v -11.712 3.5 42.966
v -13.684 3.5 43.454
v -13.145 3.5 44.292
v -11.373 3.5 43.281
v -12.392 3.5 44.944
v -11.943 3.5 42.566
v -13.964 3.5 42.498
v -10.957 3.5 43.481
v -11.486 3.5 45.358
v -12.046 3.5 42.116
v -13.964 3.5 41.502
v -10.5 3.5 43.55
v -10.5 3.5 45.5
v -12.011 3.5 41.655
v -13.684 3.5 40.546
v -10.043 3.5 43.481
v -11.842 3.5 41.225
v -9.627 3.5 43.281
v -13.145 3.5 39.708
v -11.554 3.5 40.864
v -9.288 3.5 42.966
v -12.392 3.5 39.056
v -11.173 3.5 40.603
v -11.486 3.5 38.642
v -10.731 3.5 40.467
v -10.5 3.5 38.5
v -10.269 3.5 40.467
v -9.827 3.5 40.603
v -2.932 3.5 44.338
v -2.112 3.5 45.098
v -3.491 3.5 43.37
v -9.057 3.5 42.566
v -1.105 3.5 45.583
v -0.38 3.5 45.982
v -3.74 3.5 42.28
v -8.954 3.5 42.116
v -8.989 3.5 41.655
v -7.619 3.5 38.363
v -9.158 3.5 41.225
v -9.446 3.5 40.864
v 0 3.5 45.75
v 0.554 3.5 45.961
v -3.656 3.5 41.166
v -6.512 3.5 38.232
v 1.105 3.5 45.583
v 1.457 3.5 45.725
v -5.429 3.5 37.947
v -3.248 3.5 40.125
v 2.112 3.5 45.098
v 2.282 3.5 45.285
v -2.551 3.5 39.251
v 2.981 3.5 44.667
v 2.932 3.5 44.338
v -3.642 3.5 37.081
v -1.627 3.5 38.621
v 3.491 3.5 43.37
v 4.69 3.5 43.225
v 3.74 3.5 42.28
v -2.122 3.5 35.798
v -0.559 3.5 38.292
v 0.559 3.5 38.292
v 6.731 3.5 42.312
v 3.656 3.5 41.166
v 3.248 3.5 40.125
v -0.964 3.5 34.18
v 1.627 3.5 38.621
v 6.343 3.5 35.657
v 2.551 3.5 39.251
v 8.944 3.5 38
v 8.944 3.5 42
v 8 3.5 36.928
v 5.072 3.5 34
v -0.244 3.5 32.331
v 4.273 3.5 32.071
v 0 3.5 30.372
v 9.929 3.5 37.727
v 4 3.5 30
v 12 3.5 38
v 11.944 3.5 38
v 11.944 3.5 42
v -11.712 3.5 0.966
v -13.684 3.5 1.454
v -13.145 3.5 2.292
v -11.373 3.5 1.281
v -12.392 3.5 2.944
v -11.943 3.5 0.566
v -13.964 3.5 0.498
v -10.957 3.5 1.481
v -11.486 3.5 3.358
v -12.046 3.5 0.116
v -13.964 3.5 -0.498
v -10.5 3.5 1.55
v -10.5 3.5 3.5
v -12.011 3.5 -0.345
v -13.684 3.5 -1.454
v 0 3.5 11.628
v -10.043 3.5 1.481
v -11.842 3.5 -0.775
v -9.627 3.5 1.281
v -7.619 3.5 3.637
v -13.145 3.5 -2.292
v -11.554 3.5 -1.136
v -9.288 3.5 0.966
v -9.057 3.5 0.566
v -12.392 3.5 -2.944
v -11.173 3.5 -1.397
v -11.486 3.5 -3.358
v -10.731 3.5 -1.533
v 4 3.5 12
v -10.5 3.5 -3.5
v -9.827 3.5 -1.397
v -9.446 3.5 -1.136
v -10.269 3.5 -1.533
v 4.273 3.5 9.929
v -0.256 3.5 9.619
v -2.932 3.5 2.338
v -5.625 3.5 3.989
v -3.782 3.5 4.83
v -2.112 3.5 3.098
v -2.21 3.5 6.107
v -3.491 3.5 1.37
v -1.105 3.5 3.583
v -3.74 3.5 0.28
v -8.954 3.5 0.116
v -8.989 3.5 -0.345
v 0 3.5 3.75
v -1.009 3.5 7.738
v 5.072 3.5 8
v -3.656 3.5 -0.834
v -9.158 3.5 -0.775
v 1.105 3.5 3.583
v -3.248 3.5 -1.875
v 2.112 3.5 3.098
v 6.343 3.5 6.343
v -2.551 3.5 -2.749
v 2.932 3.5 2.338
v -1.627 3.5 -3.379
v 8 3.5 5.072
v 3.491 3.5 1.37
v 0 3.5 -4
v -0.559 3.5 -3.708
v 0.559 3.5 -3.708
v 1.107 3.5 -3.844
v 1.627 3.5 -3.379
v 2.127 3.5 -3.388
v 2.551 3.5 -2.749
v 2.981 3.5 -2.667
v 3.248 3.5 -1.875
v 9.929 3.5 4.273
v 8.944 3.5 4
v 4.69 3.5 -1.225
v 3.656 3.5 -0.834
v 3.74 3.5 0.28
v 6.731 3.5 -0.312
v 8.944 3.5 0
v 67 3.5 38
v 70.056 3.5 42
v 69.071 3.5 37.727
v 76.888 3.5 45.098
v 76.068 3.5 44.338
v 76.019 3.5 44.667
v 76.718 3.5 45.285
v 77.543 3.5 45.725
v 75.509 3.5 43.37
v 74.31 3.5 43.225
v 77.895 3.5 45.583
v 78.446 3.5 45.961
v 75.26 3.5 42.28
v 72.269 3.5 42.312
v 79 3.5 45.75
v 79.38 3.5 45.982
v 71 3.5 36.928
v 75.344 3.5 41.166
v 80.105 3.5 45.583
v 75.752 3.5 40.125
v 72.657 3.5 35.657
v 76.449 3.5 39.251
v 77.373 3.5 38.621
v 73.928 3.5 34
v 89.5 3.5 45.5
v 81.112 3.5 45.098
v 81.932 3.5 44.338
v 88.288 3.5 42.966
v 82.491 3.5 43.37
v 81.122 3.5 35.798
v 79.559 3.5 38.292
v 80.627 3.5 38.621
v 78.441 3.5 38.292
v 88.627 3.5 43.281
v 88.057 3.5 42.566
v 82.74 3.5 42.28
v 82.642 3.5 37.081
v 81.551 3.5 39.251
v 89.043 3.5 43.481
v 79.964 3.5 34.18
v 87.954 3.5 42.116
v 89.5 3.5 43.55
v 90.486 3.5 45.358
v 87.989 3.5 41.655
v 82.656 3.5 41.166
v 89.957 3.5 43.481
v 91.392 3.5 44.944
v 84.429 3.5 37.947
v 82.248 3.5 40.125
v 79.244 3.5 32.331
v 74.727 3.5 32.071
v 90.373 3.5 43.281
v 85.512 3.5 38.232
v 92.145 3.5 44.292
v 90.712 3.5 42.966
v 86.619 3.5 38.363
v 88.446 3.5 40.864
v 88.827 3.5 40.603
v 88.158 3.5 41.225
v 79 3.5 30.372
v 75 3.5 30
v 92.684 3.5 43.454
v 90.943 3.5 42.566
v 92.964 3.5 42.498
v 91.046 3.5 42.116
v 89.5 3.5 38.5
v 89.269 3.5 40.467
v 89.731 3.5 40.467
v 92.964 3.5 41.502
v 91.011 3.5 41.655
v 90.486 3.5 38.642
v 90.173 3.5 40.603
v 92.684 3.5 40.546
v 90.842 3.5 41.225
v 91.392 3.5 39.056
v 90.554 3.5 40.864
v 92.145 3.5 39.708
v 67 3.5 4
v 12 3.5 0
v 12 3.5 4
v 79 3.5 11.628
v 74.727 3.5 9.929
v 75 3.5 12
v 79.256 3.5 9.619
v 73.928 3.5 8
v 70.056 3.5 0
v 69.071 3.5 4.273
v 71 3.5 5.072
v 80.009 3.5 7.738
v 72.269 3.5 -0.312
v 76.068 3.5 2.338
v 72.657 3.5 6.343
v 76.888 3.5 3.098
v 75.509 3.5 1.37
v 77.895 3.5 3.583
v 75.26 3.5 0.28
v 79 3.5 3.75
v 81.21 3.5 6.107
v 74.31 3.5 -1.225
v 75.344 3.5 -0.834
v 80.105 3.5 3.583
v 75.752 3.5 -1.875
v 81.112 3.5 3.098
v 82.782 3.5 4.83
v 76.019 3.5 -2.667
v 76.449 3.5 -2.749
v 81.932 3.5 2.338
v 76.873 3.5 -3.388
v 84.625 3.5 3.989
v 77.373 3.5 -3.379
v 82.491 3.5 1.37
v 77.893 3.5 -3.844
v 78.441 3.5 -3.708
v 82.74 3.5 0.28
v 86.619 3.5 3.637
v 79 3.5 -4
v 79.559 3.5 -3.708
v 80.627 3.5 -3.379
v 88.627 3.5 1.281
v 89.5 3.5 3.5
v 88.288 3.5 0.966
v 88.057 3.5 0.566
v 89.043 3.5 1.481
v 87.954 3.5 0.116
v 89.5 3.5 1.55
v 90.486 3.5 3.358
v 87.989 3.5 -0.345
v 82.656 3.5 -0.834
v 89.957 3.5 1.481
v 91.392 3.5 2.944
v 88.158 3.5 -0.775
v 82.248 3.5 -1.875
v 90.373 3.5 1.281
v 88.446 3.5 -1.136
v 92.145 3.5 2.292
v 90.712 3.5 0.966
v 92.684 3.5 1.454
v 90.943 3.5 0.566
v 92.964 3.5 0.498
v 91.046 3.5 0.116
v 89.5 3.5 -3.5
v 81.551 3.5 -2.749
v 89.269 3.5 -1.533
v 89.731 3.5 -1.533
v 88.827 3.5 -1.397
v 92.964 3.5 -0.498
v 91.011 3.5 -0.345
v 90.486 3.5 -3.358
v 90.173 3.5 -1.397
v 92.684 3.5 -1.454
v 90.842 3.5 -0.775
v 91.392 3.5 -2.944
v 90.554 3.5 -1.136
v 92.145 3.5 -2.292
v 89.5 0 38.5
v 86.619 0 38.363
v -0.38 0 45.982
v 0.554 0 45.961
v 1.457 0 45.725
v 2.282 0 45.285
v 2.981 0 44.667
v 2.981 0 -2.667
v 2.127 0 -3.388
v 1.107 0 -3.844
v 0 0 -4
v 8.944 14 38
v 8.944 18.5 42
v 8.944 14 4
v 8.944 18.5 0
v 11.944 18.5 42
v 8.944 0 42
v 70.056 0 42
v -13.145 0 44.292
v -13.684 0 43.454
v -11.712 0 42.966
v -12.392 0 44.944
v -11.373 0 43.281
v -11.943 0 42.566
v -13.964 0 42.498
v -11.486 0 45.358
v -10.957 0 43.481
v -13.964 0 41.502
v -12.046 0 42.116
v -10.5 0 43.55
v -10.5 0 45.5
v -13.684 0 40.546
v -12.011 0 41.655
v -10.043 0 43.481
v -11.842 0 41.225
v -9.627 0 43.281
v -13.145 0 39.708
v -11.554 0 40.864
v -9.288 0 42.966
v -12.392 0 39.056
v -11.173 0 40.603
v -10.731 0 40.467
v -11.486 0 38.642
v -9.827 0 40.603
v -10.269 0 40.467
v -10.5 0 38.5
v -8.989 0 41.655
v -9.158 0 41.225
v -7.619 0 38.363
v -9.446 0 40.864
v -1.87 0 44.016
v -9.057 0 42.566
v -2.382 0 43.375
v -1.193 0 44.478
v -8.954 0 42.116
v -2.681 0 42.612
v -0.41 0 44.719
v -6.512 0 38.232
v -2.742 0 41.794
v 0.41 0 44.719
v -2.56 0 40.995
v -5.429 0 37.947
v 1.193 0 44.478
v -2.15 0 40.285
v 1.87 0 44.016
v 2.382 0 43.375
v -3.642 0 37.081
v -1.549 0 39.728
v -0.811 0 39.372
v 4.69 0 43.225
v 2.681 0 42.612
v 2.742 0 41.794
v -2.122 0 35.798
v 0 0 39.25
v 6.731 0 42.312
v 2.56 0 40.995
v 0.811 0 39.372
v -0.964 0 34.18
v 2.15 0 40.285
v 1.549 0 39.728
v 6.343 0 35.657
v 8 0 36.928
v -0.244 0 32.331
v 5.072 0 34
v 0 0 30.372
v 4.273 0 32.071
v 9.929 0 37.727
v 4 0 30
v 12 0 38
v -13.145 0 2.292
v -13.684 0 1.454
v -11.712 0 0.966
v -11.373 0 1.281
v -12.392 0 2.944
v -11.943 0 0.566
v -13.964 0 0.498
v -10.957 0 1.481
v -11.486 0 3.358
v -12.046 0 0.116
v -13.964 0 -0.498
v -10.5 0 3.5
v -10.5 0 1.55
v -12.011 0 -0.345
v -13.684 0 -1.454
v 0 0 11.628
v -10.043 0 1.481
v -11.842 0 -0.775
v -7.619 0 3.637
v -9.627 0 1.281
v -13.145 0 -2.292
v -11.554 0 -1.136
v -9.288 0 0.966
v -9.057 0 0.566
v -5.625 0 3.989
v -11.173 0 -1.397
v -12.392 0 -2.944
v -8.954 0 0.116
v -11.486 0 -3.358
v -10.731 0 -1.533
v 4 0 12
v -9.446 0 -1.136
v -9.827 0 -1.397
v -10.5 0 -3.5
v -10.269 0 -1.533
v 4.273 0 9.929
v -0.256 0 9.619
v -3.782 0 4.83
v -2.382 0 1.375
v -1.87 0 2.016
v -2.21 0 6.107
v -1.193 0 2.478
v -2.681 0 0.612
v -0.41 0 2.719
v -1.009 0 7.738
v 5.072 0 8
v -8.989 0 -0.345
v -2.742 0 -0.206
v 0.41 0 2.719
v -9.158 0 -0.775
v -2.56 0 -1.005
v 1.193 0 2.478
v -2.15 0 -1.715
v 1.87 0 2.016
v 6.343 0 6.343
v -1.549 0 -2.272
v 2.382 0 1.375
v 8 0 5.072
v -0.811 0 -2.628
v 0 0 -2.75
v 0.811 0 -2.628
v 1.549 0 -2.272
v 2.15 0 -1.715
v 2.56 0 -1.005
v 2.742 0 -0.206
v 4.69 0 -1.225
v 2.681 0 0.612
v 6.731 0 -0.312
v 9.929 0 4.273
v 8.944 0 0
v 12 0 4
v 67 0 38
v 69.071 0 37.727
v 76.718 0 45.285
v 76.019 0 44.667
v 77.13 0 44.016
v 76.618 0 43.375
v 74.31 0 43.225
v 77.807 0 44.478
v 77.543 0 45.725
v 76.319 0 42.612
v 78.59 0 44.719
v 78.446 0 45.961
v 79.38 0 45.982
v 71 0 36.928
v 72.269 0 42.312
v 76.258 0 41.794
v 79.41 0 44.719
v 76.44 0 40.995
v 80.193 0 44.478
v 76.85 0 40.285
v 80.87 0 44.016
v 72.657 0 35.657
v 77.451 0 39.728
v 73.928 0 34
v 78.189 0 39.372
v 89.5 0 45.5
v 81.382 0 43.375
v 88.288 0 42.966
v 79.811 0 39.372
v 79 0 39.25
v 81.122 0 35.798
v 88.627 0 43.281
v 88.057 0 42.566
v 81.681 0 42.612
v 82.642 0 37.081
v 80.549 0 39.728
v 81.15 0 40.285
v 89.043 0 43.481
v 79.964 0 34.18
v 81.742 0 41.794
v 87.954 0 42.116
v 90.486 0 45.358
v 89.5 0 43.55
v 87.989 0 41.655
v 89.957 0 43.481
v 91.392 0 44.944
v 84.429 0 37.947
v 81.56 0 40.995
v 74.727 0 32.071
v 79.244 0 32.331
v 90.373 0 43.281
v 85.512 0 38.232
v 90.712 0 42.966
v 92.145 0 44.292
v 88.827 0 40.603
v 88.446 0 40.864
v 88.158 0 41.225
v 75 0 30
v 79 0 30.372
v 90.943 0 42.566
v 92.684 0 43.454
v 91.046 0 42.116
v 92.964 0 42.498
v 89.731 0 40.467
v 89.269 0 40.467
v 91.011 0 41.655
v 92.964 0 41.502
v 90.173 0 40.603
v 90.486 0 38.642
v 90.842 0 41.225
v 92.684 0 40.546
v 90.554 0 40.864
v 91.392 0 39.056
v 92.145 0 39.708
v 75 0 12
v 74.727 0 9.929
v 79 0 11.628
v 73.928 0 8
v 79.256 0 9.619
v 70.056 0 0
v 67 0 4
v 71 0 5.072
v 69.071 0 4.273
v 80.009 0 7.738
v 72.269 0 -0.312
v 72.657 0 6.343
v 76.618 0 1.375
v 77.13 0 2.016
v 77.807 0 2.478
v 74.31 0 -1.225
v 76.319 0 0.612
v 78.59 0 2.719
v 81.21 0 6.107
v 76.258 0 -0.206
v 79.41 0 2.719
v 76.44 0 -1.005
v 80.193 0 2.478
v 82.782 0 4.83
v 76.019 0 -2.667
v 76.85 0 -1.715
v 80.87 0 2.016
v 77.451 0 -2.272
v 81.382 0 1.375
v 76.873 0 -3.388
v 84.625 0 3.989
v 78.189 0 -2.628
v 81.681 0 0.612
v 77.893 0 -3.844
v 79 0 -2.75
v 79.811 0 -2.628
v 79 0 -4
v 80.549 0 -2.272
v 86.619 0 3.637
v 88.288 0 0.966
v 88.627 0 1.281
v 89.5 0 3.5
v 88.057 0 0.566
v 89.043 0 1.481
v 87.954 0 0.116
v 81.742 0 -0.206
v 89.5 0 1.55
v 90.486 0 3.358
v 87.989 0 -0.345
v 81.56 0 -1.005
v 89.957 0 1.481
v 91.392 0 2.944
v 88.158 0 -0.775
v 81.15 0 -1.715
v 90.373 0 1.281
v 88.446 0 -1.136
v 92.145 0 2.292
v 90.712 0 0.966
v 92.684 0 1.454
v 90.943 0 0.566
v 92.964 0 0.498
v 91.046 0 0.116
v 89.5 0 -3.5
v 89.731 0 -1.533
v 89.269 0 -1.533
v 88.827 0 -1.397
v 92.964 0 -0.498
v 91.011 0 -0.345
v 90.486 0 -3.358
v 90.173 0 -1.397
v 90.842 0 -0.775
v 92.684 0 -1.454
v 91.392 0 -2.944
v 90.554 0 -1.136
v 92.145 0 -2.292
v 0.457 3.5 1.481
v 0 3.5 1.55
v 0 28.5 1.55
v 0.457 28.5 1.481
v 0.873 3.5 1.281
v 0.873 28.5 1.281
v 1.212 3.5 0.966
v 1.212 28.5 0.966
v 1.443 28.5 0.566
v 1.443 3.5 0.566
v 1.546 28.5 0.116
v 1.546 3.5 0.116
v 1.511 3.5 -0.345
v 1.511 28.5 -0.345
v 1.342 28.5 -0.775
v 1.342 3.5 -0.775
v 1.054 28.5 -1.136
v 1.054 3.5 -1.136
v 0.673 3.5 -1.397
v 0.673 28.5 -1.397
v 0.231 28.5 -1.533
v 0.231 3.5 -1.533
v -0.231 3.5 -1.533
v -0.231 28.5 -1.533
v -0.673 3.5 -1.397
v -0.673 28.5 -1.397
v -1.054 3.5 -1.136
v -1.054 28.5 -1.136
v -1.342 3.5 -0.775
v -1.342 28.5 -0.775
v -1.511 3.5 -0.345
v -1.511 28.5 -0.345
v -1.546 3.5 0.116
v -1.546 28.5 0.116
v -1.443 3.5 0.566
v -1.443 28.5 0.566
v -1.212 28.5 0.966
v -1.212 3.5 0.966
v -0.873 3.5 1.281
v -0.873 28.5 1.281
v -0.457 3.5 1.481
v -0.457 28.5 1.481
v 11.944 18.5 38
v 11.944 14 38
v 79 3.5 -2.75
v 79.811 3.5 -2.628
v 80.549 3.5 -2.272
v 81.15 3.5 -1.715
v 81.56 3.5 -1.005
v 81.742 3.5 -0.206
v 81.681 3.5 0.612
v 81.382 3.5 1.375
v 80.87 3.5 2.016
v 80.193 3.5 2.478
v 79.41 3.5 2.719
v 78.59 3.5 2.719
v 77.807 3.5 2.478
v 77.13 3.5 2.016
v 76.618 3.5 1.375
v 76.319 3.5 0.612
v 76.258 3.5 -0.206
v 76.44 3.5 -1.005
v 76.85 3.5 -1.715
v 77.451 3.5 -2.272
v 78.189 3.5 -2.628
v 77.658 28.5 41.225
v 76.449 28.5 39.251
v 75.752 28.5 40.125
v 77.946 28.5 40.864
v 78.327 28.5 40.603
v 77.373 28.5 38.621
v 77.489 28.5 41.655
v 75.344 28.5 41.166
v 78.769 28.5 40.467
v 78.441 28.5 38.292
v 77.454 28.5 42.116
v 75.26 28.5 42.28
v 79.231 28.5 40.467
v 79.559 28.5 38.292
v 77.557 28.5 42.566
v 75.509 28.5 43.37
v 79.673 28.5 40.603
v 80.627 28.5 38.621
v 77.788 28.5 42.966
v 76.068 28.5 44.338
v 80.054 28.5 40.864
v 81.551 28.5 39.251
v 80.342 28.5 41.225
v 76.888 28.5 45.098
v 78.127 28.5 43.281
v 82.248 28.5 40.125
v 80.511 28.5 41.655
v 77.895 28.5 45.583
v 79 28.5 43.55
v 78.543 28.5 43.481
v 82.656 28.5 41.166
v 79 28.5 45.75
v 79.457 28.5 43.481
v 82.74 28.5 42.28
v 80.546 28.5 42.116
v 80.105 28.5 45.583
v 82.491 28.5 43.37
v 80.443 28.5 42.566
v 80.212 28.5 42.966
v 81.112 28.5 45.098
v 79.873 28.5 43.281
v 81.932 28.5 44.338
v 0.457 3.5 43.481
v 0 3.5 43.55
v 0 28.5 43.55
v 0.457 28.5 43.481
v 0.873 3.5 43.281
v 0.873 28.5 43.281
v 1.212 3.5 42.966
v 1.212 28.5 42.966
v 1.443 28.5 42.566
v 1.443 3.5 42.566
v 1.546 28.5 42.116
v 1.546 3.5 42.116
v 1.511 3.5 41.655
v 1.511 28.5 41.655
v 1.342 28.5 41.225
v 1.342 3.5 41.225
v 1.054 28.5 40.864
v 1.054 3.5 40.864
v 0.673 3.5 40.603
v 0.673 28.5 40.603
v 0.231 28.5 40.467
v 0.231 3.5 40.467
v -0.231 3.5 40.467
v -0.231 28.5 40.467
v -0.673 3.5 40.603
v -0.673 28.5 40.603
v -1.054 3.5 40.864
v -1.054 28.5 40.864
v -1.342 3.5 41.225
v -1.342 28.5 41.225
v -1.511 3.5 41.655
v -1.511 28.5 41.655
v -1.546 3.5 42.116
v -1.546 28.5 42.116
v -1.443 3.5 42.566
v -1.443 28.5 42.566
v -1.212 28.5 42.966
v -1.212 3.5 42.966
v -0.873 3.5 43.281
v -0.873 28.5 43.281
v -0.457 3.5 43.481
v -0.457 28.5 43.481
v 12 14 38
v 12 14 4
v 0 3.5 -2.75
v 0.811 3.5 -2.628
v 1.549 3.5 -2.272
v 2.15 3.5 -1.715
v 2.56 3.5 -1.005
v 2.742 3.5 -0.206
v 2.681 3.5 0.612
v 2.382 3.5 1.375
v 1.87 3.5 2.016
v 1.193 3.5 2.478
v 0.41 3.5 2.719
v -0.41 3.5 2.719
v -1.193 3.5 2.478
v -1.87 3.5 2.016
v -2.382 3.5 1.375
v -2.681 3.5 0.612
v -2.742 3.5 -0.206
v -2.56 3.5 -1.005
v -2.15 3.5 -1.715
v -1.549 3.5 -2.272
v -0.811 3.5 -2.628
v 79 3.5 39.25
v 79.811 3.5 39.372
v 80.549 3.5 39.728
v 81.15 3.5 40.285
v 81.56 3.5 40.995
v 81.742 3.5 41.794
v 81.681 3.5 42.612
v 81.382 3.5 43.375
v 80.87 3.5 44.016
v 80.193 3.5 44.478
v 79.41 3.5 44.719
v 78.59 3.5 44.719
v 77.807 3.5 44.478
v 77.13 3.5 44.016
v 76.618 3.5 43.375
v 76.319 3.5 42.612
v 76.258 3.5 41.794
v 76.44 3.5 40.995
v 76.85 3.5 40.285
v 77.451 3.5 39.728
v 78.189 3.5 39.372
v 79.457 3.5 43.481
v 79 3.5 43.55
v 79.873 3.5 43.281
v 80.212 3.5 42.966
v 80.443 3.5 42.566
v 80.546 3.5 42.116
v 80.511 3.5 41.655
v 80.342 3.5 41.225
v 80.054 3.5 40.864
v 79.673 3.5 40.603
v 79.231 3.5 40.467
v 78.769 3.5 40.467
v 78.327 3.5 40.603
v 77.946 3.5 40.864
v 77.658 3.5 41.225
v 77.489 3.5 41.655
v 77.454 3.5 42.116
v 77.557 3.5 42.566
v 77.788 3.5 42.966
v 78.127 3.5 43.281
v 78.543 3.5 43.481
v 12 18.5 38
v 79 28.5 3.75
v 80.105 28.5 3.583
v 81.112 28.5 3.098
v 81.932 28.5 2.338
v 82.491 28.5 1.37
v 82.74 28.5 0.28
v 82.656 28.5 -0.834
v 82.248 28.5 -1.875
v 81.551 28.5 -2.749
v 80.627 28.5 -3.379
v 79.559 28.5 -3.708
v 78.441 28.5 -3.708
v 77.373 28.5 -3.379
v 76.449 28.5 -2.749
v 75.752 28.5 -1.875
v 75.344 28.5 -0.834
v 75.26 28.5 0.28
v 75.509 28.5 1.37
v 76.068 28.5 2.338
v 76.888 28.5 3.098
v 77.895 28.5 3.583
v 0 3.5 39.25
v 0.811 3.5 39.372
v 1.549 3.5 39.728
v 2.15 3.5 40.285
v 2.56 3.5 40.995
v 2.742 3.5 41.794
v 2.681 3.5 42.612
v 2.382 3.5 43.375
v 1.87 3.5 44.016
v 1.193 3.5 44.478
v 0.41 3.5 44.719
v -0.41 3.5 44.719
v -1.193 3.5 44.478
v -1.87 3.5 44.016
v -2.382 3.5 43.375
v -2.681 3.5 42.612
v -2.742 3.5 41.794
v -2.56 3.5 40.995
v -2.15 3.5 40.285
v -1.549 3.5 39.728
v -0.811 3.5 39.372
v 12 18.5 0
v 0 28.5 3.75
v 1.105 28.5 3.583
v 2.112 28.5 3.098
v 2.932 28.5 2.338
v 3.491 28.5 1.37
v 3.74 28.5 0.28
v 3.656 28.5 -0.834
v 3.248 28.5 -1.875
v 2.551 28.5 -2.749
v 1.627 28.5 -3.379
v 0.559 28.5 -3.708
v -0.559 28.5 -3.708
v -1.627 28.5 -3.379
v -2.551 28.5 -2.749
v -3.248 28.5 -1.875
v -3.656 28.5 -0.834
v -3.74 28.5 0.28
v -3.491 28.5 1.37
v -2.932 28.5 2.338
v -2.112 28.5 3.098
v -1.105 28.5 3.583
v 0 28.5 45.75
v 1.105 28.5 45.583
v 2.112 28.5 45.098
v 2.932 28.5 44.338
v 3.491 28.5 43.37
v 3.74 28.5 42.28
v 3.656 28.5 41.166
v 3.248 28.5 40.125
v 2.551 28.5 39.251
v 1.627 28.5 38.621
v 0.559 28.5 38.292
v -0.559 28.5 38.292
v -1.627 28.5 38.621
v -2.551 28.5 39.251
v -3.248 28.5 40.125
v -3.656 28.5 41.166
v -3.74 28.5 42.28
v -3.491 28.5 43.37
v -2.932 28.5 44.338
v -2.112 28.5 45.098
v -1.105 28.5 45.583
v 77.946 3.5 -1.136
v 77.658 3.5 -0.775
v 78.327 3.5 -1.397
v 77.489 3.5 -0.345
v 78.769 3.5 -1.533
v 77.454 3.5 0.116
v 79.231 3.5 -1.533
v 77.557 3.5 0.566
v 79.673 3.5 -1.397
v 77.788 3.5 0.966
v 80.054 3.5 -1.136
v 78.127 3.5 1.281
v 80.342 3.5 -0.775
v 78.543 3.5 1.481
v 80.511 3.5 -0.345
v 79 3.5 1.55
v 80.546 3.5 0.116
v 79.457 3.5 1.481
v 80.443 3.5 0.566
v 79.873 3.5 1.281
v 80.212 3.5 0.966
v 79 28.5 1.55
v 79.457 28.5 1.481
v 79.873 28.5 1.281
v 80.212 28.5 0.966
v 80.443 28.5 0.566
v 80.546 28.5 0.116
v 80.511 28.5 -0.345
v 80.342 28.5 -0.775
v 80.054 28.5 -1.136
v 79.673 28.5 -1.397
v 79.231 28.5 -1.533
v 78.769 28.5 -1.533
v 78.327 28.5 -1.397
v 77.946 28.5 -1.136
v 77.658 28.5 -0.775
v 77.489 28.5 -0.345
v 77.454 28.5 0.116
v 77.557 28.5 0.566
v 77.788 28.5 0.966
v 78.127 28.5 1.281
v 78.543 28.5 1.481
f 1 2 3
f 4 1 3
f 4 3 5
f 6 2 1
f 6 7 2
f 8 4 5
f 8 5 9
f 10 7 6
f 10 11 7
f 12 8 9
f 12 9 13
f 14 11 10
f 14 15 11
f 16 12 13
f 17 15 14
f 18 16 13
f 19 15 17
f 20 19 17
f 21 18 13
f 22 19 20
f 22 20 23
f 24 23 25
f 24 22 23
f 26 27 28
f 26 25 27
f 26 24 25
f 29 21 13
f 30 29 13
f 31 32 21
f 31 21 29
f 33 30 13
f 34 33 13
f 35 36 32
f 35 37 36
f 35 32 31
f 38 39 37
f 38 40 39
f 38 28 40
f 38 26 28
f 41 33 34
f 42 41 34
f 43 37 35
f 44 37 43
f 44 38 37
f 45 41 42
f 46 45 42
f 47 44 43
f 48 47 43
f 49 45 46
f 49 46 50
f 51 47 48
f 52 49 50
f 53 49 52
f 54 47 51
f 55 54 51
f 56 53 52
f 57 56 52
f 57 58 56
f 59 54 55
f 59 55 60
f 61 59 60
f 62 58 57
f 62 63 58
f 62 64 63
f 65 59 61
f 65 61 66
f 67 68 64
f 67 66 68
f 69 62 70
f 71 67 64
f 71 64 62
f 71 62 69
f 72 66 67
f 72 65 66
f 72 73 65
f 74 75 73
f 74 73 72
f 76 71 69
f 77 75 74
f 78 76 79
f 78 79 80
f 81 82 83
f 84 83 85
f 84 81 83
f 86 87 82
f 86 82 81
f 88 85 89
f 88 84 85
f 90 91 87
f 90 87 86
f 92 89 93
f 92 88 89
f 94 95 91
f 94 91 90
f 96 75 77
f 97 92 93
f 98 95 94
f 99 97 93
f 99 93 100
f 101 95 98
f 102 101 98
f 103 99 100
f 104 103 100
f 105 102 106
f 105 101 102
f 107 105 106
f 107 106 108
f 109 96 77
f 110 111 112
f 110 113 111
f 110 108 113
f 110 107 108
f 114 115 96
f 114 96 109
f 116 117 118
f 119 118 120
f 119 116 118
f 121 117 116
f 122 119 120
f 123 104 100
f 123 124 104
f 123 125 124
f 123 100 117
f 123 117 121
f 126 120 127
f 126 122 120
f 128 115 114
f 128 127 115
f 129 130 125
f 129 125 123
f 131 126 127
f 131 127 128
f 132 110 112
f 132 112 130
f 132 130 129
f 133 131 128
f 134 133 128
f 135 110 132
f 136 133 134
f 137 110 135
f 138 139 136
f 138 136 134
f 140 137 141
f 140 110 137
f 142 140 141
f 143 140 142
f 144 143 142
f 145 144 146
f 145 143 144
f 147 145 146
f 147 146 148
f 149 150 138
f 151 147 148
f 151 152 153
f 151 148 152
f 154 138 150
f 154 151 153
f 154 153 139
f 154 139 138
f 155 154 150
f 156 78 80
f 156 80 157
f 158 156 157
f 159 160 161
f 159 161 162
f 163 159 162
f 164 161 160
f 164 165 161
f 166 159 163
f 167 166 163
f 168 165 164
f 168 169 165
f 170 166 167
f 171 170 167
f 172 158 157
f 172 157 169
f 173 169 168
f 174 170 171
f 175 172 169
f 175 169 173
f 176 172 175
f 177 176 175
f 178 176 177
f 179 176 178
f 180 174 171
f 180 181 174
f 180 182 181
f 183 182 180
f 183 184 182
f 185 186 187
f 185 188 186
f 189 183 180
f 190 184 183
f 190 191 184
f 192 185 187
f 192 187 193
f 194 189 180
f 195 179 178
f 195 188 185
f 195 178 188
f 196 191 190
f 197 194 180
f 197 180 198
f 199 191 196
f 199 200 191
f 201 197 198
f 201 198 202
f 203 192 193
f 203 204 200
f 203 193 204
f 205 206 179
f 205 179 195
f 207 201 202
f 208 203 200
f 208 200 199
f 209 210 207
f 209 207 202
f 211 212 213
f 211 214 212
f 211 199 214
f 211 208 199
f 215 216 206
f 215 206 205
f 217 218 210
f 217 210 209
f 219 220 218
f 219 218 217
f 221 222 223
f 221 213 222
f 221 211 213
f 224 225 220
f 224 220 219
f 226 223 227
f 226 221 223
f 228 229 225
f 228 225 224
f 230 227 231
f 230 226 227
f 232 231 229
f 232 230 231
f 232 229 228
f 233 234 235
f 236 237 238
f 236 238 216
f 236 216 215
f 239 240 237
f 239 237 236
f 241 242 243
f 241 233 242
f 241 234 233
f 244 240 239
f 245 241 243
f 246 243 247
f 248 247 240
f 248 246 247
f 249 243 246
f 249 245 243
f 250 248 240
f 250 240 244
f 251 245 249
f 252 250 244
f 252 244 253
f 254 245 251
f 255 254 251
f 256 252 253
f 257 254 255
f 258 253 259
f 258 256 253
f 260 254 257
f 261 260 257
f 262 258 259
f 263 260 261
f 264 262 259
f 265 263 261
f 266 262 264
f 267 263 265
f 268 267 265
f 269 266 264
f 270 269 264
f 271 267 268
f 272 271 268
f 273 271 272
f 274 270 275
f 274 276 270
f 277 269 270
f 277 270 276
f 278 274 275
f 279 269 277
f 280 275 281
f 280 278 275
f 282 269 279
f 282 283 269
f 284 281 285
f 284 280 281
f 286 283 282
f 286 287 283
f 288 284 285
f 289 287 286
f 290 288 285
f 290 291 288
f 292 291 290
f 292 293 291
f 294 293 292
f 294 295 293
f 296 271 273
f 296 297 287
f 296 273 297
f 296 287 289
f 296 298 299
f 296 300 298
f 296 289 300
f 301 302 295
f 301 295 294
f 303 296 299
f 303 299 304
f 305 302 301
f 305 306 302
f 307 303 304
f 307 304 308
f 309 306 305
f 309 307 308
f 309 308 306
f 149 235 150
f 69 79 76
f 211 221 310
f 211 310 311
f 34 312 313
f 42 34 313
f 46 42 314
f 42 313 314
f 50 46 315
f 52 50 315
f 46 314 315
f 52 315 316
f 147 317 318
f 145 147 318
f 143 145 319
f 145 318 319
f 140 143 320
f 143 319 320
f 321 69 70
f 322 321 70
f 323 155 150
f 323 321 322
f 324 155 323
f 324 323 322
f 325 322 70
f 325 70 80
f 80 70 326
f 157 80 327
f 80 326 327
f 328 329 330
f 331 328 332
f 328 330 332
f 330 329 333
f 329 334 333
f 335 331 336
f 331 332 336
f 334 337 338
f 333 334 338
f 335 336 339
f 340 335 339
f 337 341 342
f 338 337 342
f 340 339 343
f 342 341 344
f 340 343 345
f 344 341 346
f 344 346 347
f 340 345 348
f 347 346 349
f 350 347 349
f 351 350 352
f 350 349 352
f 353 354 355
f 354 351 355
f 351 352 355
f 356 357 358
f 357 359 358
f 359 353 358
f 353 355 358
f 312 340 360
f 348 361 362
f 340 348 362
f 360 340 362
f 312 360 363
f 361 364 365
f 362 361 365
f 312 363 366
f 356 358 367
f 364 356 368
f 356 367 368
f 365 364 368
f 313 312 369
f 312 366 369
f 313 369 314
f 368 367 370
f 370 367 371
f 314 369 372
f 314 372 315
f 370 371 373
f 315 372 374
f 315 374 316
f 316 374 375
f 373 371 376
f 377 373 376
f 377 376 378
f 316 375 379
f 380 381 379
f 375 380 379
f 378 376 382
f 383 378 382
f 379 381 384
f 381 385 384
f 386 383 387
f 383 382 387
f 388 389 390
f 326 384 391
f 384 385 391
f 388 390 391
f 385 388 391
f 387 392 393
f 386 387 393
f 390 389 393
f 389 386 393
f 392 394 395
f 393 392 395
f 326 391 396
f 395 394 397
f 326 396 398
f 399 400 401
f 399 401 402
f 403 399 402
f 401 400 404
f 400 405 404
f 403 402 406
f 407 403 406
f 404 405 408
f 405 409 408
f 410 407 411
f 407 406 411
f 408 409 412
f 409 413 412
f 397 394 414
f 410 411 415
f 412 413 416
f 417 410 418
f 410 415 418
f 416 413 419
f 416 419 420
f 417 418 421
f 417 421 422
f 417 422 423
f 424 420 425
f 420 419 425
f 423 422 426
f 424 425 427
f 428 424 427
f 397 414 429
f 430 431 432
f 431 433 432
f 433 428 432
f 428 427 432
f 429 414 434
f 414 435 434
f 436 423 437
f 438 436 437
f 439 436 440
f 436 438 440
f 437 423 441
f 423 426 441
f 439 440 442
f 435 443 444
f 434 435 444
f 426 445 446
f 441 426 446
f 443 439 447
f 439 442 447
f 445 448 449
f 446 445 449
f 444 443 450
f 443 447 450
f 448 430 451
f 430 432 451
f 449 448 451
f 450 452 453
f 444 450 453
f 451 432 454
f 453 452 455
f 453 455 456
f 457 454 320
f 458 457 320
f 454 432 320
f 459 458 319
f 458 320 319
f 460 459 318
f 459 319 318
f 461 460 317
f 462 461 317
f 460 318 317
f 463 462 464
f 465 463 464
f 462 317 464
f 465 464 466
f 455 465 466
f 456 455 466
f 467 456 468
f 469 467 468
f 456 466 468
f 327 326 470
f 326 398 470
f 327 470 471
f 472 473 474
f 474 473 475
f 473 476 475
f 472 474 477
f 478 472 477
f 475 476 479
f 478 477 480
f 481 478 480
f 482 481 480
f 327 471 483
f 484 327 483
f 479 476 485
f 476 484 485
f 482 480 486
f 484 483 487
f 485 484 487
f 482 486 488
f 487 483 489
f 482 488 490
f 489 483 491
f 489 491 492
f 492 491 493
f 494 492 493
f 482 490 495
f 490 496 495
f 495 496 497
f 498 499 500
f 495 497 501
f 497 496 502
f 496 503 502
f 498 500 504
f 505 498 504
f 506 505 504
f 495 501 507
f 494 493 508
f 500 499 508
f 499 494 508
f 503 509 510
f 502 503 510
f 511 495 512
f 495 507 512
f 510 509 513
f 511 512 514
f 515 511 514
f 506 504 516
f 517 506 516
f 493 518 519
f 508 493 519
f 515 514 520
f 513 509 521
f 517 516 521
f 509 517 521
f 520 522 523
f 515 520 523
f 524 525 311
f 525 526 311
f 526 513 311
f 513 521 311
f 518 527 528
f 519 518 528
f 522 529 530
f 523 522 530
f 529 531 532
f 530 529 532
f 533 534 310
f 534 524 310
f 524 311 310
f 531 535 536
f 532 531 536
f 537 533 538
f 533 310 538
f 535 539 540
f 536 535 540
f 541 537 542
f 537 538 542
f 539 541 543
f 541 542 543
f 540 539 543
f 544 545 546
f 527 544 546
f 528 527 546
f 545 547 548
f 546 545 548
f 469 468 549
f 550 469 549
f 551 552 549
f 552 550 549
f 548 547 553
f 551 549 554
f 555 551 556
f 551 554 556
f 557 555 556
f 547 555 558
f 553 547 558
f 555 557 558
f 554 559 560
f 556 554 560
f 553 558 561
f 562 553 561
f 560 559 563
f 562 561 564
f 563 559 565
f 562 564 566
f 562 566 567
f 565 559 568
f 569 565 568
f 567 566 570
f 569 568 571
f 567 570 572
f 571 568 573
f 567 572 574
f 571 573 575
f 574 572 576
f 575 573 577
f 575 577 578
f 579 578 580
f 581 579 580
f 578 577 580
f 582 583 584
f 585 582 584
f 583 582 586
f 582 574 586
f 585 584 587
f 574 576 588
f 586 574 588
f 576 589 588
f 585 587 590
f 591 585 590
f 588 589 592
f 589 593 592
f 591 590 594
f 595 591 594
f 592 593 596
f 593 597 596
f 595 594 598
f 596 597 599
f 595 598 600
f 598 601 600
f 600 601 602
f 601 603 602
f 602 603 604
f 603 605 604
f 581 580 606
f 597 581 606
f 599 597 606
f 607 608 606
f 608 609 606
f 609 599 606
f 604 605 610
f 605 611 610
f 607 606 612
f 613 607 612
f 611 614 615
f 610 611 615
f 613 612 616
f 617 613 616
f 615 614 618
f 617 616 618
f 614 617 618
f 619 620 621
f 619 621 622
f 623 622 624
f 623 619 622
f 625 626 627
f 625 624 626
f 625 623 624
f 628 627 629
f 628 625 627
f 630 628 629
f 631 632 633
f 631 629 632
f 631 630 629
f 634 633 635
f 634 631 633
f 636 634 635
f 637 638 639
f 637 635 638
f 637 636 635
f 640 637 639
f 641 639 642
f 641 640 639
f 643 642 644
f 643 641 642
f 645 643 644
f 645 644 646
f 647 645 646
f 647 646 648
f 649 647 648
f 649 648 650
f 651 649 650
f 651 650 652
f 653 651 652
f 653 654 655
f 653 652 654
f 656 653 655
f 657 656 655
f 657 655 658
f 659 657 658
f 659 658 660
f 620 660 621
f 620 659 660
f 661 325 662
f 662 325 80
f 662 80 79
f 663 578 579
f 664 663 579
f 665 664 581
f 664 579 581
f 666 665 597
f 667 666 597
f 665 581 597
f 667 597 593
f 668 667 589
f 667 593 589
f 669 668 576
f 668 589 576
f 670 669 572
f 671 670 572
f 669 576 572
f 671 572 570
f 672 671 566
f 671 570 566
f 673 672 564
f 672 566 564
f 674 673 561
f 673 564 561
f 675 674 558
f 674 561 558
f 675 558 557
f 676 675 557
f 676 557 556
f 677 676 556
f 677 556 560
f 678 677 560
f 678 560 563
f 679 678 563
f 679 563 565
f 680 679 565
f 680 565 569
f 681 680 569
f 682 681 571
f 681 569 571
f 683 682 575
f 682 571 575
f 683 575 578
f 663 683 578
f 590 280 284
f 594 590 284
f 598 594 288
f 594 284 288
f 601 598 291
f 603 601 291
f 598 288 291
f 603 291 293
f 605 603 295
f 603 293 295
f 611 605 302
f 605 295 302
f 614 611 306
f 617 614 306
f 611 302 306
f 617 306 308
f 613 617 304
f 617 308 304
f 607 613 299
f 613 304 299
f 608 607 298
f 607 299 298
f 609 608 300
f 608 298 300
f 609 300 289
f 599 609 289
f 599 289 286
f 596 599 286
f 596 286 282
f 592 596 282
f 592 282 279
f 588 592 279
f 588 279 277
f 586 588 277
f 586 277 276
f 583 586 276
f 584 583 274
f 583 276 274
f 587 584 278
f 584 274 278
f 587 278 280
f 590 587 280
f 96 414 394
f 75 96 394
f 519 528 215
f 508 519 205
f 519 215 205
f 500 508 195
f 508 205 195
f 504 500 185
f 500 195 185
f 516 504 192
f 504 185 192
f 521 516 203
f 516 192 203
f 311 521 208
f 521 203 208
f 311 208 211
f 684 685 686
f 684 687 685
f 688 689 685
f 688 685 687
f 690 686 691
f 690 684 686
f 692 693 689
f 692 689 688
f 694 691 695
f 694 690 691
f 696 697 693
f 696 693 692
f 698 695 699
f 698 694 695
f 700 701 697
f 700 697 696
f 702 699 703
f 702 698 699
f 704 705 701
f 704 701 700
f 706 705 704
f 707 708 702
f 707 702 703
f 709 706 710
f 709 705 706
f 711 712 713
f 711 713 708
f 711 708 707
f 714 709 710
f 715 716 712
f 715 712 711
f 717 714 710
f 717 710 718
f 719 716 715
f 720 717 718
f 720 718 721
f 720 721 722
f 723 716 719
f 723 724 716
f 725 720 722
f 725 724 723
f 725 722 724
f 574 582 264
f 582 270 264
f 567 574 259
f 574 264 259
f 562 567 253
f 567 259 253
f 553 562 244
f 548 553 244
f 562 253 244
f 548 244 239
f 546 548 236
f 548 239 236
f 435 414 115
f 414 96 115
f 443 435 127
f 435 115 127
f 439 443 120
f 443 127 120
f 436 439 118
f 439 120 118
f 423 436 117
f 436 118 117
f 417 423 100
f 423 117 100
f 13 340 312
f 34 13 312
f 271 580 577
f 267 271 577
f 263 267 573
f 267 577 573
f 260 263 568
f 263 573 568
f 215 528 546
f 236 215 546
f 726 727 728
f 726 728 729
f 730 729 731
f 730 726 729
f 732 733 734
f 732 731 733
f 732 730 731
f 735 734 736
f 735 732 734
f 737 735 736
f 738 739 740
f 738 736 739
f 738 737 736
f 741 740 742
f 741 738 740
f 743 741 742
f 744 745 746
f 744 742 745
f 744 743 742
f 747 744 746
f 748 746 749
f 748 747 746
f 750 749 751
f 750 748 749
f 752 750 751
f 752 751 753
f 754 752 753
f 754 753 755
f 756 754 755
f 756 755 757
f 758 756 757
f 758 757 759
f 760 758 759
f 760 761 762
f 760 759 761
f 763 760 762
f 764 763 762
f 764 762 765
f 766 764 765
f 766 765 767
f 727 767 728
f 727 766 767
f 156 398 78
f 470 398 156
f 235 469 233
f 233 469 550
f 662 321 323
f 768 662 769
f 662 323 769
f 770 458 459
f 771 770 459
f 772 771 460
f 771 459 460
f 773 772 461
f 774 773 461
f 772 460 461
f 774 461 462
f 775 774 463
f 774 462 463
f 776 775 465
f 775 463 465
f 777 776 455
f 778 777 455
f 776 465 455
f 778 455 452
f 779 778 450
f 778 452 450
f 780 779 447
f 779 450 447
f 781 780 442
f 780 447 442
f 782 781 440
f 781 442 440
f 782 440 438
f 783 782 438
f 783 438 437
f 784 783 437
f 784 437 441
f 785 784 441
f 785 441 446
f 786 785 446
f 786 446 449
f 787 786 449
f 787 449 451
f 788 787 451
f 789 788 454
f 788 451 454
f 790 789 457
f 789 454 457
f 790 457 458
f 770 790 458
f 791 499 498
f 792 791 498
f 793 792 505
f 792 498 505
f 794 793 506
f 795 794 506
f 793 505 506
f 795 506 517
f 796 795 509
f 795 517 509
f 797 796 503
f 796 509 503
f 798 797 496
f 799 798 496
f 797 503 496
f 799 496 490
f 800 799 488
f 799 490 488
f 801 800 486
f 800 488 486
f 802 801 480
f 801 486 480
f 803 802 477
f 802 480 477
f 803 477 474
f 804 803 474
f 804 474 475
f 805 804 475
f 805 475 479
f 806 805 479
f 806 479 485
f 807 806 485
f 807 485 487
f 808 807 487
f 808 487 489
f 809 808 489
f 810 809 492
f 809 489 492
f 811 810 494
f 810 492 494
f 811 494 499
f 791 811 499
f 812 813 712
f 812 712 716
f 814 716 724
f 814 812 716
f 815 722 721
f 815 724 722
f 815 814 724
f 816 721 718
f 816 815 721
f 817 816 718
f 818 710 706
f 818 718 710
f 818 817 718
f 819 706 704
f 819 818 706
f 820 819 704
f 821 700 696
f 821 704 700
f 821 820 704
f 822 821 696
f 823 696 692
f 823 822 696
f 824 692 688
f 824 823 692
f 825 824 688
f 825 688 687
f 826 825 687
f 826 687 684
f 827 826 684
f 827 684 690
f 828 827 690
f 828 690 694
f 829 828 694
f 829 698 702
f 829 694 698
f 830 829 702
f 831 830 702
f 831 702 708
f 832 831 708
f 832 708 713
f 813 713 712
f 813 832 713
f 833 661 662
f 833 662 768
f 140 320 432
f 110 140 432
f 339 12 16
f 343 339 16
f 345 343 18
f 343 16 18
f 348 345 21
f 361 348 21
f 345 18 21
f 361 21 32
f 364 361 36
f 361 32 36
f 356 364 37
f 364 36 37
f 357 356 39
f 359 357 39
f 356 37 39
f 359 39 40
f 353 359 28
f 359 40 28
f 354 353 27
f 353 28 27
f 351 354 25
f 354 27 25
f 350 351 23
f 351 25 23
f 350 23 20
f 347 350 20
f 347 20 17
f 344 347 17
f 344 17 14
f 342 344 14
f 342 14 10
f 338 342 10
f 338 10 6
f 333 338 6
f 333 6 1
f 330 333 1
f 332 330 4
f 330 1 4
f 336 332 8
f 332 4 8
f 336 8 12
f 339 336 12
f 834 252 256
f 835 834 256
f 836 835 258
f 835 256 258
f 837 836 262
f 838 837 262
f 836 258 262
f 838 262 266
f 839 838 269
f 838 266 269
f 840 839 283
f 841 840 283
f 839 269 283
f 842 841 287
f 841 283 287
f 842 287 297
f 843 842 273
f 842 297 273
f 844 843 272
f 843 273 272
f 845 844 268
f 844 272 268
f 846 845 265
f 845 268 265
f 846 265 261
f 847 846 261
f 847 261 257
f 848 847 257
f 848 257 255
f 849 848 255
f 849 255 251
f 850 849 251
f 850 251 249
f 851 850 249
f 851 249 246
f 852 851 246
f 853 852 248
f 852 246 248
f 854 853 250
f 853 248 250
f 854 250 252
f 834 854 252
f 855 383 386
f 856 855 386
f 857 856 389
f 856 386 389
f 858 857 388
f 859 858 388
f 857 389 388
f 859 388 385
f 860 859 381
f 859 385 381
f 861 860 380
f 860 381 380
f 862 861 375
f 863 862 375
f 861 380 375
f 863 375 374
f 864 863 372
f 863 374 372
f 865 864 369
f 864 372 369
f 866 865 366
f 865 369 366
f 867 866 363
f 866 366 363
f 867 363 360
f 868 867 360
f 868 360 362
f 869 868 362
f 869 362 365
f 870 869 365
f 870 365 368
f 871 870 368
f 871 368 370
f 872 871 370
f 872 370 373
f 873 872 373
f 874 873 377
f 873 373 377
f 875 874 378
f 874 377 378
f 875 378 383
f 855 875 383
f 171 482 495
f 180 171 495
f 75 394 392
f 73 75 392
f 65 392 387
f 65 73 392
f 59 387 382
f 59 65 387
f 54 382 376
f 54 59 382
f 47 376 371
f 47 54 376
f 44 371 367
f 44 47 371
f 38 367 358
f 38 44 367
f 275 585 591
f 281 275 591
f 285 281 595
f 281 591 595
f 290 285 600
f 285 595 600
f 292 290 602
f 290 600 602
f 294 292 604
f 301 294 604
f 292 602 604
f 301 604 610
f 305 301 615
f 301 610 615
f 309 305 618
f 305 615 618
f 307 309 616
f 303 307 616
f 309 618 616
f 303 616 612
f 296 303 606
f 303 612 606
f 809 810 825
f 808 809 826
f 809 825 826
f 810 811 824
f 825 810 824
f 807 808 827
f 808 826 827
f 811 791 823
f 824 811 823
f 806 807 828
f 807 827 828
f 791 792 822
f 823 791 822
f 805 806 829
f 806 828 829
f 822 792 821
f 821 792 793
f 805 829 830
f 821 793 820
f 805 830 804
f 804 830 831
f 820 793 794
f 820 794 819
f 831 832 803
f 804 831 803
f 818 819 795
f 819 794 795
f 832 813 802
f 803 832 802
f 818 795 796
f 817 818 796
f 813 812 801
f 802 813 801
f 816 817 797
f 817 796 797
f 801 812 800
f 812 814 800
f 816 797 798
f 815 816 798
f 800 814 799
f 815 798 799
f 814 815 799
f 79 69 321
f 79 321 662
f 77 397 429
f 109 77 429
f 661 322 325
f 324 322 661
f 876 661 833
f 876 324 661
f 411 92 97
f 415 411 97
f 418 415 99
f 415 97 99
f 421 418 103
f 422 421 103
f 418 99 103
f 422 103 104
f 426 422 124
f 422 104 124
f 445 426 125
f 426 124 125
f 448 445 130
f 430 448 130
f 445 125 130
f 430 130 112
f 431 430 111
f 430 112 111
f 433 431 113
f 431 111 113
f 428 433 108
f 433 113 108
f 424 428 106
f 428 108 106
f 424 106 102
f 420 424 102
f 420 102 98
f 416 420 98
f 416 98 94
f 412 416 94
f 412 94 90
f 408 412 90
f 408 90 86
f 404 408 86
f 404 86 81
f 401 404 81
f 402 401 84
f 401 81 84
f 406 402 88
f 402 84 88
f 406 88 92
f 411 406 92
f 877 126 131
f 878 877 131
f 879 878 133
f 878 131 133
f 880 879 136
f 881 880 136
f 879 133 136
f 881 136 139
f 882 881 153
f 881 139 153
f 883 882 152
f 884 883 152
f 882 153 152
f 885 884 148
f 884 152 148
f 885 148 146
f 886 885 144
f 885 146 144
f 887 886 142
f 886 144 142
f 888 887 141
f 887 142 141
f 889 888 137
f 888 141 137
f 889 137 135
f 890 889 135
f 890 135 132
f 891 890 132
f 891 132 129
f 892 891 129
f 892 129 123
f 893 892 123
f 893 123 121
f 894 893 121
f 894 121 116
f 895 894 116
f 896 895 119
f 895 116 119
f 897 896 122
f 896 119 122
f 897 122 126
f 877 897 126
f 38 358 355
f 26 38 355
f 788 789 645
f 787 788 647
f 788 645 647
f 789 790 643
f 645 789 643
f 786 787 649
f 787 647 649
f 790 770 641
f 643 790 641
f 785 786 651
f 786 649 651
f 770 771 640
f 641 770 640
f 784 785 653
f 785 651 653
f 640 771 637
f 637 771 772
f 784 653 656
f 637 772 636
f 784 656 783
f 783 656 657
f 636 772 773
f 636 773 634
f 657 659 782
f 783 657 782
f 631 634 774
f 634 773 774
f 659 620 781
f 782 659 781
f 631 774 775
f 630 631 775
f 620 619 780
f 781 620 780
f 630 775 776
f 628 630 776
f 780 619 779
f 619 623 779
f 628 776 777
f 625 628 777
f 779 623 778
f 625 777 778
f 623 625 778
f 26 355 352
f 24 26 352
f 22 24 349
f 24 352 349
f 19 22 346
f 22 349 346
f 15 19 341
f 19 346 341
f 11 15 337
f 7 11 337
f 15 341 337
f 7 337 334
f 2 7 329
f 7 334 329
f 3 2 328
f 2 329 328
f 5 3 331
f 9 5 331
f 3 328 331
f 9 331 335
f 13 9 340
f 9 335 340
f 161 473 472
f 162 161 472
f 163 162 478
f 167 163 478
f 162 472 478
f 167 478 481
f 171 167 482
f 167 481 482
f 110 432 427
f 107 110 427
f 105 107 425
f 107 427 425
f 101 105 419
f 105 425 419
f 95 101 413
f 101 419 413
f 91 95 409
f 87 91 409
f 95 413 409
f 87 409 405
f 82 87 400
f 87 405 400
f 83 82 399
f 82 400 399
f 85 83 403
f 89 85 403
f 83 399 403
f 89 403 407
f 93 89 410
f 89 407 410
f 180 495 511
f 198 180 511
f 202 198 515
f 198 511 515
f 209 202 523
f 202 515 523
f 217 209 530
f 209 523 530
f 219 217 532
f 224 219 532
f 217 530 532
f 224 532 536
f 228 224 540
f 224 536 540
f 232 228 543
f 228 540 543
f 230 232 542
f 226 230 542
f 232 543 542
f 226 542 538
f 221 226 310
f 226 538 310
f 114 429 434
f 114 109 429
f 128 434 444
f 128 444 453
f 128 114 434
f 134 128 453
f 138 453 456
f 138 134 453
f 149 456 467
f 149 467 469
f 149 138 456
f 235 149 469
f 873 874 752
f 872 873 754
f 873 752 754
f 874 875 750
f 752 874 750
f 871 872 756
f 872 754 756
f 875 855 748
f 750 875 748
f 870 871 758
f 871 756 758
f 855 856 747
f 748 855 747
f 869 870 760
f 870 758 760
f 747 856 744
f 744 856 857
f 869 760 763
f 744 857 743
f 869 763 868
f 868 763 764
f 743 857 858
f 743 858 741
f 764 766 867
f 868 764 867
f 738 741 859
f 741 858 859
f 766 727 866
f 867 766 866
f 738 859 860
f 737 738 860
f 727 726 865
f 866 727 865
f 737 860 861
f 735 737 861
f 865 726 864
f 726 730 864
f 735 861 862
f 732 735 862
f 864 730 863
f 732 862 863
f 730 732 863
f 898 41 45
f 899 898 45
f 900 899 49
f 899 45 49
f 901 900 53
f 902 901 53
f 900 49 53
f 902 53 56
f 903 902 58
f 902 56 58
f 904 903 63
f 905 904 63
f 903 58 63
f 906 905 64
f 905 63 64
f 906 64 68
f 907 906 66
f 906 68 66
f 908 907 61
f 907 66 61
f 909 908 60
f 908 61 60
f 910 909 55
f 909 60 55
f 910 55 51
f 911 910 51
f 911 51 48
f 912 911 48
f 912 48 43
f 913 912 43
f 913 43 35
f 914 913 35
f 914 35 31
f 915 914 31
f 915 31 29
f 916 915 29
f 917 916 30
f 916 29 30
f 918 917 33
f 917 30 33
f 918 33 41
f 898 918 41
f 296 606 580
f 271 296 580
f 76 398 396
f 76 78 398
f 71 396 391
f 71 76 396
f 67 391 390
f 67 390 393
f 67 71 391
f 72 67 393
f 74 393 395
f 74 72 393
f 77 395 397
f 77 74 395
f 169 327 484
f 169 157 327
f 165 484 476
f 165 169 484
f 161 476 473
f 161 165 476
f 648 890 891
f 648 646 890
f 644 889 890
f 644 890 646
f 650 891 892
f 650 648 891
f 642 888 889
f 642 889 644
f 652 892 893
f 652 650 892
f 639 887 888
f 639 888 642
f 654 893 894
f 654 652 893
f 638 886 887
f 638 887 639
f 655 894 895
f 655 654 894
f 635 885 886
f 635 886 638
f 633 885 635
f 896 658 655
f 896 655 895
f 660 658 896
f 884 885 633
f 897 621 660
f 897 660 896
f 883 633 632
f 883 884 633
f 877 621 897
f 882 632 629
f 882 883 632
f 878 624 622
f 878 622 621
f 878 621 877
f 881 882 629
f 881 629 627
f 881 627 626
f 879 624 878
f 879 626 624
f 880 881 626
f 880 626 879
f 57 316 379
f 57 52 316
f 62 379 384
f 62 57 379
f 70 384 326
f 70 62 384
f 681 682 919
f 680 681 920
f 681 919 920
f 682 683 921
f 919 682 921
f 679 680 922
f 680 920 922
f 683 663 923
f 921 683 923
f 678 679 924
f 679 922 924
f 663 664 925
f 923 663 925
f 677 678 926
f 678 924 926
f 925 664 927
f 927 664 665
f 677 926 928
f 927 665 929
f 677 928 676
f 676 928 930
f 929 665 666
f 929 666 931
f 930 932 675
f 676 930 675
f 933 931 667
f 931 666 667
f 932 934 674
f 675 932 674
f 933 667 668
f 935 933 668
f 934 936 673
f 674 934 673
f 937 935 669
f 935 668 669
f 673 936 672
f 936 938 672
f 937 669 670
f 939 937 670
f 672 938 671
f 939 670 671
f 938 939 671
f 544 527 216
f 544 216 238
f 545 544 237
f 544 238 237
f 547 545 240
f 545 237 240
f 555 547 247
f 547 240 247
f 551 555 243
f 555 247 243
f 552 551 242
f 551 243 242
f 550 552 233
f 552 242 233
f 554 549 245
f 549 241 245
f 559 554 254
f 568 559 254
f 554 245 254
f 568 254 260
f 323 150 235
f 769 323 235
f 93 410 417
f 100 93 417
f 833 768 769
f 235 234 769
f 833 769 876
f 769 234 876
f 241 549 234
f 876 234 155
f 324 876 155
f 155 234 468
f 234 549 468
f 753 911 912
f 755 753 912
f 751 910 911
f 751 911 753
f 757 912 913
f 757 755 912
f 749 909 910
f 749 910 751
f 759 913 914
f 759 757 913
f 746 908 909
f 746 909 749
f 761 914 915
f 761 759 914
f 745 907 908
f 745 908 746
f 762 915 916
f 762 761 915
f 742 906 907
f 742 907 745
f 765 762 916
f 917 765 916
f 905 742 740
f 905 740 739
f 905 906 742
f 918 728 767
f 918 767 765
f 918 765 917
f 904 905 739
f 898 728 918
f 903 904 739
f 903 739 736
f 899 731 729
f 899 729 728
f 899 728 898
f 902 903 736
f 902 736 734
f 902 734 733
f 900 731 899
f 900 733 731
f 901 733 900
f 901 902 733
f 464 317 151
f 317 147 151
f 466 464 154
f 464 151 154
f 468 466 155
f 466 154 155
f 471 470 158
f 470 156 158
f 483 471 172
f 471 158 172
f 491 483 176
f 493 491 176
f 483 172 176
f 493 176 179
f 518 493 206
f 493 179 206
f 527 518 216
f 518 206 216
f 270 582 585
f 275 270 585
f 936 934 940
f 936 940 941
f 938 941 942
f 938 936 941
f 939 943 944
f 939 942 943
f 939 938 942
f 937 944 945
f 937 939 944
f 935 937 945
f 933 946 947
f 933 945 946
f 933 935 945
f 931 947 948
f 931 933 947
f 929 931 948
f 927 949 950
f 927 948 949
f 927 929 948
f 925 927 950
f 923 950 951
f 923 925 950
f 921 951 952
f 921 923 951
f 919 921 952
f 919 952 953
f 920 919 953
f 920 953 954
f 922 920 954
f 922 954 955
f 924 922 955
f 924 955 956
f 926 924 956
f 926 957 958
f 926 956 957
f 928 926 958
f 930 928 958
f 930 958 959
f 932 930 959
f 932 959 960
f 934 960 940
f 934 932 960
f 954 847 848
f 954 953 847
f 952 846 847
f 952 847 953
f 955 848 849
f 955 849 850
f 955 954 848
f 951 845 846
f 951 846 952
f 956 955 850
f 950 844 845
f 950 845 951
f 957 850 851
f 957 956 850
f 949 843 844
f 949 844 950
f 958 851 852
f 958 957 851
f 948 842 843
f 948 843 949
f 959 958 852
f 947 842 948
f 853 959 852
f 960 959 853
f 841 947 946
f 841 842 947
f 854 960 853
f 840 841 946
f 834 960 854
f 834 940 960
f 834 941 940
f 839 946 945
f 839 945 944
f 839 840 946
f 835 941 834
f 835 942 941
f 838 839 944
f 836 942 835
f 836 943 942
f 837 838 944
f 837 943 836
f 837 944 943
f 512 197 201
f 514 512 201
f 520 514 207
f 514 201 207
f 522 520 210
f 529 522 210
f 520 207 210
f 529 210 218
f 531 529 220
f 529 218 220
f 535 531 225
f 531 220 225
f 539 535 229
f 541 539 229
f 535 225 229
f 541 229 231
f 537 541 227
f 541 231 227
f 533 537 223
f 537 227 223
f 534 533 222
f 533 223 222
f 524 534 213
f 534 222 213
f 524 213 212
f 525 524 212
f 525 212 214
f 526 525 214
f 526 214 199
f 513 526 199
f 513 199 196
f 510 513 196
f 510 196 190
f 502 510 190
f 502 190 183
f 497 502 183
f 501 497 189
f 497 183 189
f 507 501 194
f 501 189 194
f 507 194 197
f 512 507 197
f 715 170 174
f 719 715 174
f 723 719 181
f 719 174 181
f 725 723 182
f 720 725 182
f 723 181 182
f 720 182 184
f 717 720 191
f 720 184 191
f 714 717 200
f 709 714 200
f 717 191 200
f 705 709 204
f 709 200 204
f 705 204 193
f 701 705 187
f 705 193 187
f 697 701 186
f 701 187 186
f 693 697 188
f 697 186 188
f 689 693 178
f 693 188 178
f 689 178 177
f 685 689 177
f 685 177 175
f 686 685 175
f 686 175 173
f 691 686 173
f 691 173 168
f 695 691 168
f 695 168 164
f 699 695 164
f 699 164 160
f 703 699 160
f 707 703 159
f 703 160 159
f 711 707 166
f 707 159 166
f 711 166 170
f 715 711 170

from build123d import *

# Parameters (mm, degrees)
SKETCH10_W              = 71
SKETCH10_H              = 34
BOSS_EXTRUDE6_DEPTH     = 3.5
SKETCH11_R              = 1.55
CUT_EXTRUDE6_DEPTH      = 3.5
SKETCH12_R              = 2.75
CUT_EXTRUDE7_DEPTH      = 3.5
SKETCH13_R              = 3.75
BOSS_EXTRUDE7_DEPTH     = 25
CUT_EXTRUDE8_DEPTH      = 108.597630085
CUT_EXTRUDE8_DEPTH_BACK = 108.597630085
SKETCH14_R              = 1.55
FILLET6_R               = 8
FILLET7_R               = 8
SKETCH16_W              = 3
SKETCH16_H              = 4
SKETCH16_W_2            = 3.05572809
BOSS_EXTRUDE10_DEPTH    = 15
SKETCH18_W              = 3.05572809
SKETCH18_H              = 4.5
BOSS_EXTRUDE11_DEPTH    = 34


with BuildPart() as part:
    # Sketch10 → Boss-Extrude6 (new body)
    with BuildSketch(Plane(origin=(0, 0, 0), x_dir=(1, 0, 0), z_dir=(0, 1, 0))):
        with BuildLine():
            Line((0, -4), (0, -38))
            ThreePointArc((0, -38), (-0.190260598, -38.004527449), (-0.380090498, -38.018099548))
            Line((-0.380090498, -38.018099548), (-10.5, -38.5))
            ThreePointArc((-10.5, -38.5), (-14, -42), (-10.5, -45.5))
            Line((-10.5, -45.5), (-0.380090498, -45.981900452))
            ThreePointArc((-0.380090498, -45.981900452), (2.690691176, -44.959760294), (4, -42))
            Line((4, -42), (75, -42))
            ThreePointArc((75, -42), (76.309308824, -44.959760294), (79.380090498, -45.981900452))
            Line((79.380090498, -45.981900452), (89.5, -45.5))
            ThreePointArc((89.5, -45.5), (93, -42), (89.5, -38.5))
            Line((89.5, -38.5), (79.380090498, -38.018099548))
            ThreePointArc((79.380090498, -38.018099548), (79.190260598, -38.004527449), (79, -38))
            Line((79, -38), (79, -4))
            Line((79, -4), (89.5, -3.5))
            ThreePointArc((89.5, -3.5), (93, 0), (89.5, 3.5))
            Line((89.5, 3.5), (79, 4))
            ThreePointArc((79, 4), (76.171572875, 2.828427125), (75, 0))
            Line((75, 0), (4, 0))
            ThreePointArc((4, 0), (2.828427125, 2.828427125), (0, 4))
            Line((0, 4), (-10.5, 3.5))
            ThreePointArc((-10.5, 3.5), (-14, 0), (-10.5, -3.5))
            Line((-10.5, -3.5), (0, -4))
        make_face()
        with Locations((39.5, -21)):
            Rectangle(SKETCH10_W, SKETCH10_H, mode=Mode.SUBTRACT)
    extrude(amount=BOSS_EXTRUDE6_DEPTH)

    # Sketch11 → Cut-Extrude6 (cut)
    with BuildSketch(Plane(origin=(0, 3.5, 0), x_dir=(1, 0, 0), z_dir=(0, 1, 0))):
        with Locations(Location((0, 0, 0), (0, 0, 270))):
            Circle(SKETCH11_R)
        with Locations(Location((79, 0, 0), (0, 0, 270))):
            Circle(SKETCH11_R)
        with Locations(Location((79, -42, 0), (0, 0, 270))):
            Circle(SKETCH11_R)
        with Locations(Location((0, -42, 0), (0, 0, 270))):
            Circle(SKETCH11_R)
        with Locations(Location((-10.5, -42, 0), (0, 0, 270))):
            Circle(SKETCH11_R)
        with Locations(Location((-10.5, 0, 0), (0, 0, 270))):
            Circle(SKETCH11_R)
        with Locations(Location((89.5, 0, 0), (0, 0, 270))):
            Circle(SKETCH11_R)
        with Locations(Location((89.5, -42, 0), (0, 0, 270))):
            Circle(SKETCH11_R)
    extrude(amount=-CUT_EXTRUDE6_DEPTH, mode=Mode.SUBTRACT)

    # Sketch12 → Cut-Extrude7 (cut)
    with BuildSketch(Plane.XZ):
        with Locations(Location((0, 42, 0), (0, 0, 270))):
            Circle(SKETCH12_R)
        with Locations(Location((79, 42, 0), (0, 0, 270))):
            Circle(SKETCH12_R)
        with Locations(Location((79, 0, 0), (0, 0, 270))):
            Circle(SKETCH12_R)
        with Locations(Location((0, 0, 0), (0, 0, 270))):
            Circle(SKETCH12_R)
    extrude(amount=-CUT_EXTRUDE7_DEPTH, mode=Mode.SUBTRACT)

    # Sketch13 → Boss-Extrude7 (add)
    with BuildSketch(Plane(origin=(0, 3.5, 0), x_dir=(1, 0, 0), z_dir=(0, 1, 0))):
        with Locations(Location((0, 0, 0), (0, 0, 270))):
            Circle(SKETCH13_R)
        with Locations(Location((79, 0, 0), (0, 0, 270))):
            Circle(SKETCH13_R)
        with Locations(Location((79, -42, 0), (0, 0, 270))):
            Circle(SKETCH13_R)
        with Locations(Location((0, -42, 0), (0, 0, 270))):
            Circle(SKETCH13_R)
    extrude(amount=BOSS_EXTRUDE7_DEPTH)

    # Sketch14 → Cut-Extrude8 (cut, two sides: drawn at the far end of the back side and taken through both)
    with BuildSketch(Plane(origin=(0, 28.5, 0), x_dir=(1, 0, 0), z_dir=(0, 1, 0)).offset(-CUT_EXTRUDE8_DEPTH_BACK)):
        with Locations(Location((0, 0, 0), (0, 0, 270))):
            Circle(SKETCH14_R)
        with Locations(Location((79, 0, 0), (0, 0, 270))):
            Circle(SKETCH14_R)
        with Locations(Location((79, -42, 0), (0, 0, 270))):
            Circle(SKETCH14_R)
        with Locations(Location((0, -42, 0), (0, 0, 270))):
            Circle(SKETCH14_R)
    extrude(amount=CUT_EXTRUDE8_DEPTH + CUT_EXTRUDE8_DEPTH_BACK, mode=Mode.SUBTRACT)

    # Fillet6
    fillet6_edges = [part.edges().sort_by_distance(p)[0] for p in [
        (75, 1.75, 0),
        (4, 1.75, 0),
        (4, 1.75, 42),
        (75, 1.75, 42),
        (79, 1.75, 38),
        (79, 1.75, 4),
        (0, 1.75, 38),
        (0, 1.75, 4),
    ]]
    fillet(fillet6_edges, radius=FILLET6_R)

    # Fillet7
    fillet7_edges = [part.edges().sort_by_distance(p)[0] for p in [
        (75, 1.75, 38),
        (4, 1.75, 38),
        (4, 1.75, 4),
        (75, 1.75, 4),
    ]]
    fillet(fillet7_edges, radius=FILLET7_R)

    # Sketch16 → Boss-Extrude10 (add)
    with BuildSketch(Plane(origin=(0, 3.5, 0), x_dir=(1, 0, 0), z_dir=(0, 1, 0))):
        with Locations((10.44427191, -40)):
            Rectangle(SKETCH16_W, SKETCH16_H)
        with Locations((10.472135955, -2)):
            Rectangle(SKETCH16_W_2, SKETCH16_H)
    extrude(amount=BOSS_EXTRUDE10_DEPTH)

    # Sketch18 → Boss-Extrude11 (add)
    with BuildSketch(Plane.XY.offset(4)):
        with Locations((10.472135955, 16.25)):
            Rectangle(SKETCH18_W, SKETCH18_H)
    extrude(amount=BOSS_EXTRUDE11_DEPTH)


solid = part.part
